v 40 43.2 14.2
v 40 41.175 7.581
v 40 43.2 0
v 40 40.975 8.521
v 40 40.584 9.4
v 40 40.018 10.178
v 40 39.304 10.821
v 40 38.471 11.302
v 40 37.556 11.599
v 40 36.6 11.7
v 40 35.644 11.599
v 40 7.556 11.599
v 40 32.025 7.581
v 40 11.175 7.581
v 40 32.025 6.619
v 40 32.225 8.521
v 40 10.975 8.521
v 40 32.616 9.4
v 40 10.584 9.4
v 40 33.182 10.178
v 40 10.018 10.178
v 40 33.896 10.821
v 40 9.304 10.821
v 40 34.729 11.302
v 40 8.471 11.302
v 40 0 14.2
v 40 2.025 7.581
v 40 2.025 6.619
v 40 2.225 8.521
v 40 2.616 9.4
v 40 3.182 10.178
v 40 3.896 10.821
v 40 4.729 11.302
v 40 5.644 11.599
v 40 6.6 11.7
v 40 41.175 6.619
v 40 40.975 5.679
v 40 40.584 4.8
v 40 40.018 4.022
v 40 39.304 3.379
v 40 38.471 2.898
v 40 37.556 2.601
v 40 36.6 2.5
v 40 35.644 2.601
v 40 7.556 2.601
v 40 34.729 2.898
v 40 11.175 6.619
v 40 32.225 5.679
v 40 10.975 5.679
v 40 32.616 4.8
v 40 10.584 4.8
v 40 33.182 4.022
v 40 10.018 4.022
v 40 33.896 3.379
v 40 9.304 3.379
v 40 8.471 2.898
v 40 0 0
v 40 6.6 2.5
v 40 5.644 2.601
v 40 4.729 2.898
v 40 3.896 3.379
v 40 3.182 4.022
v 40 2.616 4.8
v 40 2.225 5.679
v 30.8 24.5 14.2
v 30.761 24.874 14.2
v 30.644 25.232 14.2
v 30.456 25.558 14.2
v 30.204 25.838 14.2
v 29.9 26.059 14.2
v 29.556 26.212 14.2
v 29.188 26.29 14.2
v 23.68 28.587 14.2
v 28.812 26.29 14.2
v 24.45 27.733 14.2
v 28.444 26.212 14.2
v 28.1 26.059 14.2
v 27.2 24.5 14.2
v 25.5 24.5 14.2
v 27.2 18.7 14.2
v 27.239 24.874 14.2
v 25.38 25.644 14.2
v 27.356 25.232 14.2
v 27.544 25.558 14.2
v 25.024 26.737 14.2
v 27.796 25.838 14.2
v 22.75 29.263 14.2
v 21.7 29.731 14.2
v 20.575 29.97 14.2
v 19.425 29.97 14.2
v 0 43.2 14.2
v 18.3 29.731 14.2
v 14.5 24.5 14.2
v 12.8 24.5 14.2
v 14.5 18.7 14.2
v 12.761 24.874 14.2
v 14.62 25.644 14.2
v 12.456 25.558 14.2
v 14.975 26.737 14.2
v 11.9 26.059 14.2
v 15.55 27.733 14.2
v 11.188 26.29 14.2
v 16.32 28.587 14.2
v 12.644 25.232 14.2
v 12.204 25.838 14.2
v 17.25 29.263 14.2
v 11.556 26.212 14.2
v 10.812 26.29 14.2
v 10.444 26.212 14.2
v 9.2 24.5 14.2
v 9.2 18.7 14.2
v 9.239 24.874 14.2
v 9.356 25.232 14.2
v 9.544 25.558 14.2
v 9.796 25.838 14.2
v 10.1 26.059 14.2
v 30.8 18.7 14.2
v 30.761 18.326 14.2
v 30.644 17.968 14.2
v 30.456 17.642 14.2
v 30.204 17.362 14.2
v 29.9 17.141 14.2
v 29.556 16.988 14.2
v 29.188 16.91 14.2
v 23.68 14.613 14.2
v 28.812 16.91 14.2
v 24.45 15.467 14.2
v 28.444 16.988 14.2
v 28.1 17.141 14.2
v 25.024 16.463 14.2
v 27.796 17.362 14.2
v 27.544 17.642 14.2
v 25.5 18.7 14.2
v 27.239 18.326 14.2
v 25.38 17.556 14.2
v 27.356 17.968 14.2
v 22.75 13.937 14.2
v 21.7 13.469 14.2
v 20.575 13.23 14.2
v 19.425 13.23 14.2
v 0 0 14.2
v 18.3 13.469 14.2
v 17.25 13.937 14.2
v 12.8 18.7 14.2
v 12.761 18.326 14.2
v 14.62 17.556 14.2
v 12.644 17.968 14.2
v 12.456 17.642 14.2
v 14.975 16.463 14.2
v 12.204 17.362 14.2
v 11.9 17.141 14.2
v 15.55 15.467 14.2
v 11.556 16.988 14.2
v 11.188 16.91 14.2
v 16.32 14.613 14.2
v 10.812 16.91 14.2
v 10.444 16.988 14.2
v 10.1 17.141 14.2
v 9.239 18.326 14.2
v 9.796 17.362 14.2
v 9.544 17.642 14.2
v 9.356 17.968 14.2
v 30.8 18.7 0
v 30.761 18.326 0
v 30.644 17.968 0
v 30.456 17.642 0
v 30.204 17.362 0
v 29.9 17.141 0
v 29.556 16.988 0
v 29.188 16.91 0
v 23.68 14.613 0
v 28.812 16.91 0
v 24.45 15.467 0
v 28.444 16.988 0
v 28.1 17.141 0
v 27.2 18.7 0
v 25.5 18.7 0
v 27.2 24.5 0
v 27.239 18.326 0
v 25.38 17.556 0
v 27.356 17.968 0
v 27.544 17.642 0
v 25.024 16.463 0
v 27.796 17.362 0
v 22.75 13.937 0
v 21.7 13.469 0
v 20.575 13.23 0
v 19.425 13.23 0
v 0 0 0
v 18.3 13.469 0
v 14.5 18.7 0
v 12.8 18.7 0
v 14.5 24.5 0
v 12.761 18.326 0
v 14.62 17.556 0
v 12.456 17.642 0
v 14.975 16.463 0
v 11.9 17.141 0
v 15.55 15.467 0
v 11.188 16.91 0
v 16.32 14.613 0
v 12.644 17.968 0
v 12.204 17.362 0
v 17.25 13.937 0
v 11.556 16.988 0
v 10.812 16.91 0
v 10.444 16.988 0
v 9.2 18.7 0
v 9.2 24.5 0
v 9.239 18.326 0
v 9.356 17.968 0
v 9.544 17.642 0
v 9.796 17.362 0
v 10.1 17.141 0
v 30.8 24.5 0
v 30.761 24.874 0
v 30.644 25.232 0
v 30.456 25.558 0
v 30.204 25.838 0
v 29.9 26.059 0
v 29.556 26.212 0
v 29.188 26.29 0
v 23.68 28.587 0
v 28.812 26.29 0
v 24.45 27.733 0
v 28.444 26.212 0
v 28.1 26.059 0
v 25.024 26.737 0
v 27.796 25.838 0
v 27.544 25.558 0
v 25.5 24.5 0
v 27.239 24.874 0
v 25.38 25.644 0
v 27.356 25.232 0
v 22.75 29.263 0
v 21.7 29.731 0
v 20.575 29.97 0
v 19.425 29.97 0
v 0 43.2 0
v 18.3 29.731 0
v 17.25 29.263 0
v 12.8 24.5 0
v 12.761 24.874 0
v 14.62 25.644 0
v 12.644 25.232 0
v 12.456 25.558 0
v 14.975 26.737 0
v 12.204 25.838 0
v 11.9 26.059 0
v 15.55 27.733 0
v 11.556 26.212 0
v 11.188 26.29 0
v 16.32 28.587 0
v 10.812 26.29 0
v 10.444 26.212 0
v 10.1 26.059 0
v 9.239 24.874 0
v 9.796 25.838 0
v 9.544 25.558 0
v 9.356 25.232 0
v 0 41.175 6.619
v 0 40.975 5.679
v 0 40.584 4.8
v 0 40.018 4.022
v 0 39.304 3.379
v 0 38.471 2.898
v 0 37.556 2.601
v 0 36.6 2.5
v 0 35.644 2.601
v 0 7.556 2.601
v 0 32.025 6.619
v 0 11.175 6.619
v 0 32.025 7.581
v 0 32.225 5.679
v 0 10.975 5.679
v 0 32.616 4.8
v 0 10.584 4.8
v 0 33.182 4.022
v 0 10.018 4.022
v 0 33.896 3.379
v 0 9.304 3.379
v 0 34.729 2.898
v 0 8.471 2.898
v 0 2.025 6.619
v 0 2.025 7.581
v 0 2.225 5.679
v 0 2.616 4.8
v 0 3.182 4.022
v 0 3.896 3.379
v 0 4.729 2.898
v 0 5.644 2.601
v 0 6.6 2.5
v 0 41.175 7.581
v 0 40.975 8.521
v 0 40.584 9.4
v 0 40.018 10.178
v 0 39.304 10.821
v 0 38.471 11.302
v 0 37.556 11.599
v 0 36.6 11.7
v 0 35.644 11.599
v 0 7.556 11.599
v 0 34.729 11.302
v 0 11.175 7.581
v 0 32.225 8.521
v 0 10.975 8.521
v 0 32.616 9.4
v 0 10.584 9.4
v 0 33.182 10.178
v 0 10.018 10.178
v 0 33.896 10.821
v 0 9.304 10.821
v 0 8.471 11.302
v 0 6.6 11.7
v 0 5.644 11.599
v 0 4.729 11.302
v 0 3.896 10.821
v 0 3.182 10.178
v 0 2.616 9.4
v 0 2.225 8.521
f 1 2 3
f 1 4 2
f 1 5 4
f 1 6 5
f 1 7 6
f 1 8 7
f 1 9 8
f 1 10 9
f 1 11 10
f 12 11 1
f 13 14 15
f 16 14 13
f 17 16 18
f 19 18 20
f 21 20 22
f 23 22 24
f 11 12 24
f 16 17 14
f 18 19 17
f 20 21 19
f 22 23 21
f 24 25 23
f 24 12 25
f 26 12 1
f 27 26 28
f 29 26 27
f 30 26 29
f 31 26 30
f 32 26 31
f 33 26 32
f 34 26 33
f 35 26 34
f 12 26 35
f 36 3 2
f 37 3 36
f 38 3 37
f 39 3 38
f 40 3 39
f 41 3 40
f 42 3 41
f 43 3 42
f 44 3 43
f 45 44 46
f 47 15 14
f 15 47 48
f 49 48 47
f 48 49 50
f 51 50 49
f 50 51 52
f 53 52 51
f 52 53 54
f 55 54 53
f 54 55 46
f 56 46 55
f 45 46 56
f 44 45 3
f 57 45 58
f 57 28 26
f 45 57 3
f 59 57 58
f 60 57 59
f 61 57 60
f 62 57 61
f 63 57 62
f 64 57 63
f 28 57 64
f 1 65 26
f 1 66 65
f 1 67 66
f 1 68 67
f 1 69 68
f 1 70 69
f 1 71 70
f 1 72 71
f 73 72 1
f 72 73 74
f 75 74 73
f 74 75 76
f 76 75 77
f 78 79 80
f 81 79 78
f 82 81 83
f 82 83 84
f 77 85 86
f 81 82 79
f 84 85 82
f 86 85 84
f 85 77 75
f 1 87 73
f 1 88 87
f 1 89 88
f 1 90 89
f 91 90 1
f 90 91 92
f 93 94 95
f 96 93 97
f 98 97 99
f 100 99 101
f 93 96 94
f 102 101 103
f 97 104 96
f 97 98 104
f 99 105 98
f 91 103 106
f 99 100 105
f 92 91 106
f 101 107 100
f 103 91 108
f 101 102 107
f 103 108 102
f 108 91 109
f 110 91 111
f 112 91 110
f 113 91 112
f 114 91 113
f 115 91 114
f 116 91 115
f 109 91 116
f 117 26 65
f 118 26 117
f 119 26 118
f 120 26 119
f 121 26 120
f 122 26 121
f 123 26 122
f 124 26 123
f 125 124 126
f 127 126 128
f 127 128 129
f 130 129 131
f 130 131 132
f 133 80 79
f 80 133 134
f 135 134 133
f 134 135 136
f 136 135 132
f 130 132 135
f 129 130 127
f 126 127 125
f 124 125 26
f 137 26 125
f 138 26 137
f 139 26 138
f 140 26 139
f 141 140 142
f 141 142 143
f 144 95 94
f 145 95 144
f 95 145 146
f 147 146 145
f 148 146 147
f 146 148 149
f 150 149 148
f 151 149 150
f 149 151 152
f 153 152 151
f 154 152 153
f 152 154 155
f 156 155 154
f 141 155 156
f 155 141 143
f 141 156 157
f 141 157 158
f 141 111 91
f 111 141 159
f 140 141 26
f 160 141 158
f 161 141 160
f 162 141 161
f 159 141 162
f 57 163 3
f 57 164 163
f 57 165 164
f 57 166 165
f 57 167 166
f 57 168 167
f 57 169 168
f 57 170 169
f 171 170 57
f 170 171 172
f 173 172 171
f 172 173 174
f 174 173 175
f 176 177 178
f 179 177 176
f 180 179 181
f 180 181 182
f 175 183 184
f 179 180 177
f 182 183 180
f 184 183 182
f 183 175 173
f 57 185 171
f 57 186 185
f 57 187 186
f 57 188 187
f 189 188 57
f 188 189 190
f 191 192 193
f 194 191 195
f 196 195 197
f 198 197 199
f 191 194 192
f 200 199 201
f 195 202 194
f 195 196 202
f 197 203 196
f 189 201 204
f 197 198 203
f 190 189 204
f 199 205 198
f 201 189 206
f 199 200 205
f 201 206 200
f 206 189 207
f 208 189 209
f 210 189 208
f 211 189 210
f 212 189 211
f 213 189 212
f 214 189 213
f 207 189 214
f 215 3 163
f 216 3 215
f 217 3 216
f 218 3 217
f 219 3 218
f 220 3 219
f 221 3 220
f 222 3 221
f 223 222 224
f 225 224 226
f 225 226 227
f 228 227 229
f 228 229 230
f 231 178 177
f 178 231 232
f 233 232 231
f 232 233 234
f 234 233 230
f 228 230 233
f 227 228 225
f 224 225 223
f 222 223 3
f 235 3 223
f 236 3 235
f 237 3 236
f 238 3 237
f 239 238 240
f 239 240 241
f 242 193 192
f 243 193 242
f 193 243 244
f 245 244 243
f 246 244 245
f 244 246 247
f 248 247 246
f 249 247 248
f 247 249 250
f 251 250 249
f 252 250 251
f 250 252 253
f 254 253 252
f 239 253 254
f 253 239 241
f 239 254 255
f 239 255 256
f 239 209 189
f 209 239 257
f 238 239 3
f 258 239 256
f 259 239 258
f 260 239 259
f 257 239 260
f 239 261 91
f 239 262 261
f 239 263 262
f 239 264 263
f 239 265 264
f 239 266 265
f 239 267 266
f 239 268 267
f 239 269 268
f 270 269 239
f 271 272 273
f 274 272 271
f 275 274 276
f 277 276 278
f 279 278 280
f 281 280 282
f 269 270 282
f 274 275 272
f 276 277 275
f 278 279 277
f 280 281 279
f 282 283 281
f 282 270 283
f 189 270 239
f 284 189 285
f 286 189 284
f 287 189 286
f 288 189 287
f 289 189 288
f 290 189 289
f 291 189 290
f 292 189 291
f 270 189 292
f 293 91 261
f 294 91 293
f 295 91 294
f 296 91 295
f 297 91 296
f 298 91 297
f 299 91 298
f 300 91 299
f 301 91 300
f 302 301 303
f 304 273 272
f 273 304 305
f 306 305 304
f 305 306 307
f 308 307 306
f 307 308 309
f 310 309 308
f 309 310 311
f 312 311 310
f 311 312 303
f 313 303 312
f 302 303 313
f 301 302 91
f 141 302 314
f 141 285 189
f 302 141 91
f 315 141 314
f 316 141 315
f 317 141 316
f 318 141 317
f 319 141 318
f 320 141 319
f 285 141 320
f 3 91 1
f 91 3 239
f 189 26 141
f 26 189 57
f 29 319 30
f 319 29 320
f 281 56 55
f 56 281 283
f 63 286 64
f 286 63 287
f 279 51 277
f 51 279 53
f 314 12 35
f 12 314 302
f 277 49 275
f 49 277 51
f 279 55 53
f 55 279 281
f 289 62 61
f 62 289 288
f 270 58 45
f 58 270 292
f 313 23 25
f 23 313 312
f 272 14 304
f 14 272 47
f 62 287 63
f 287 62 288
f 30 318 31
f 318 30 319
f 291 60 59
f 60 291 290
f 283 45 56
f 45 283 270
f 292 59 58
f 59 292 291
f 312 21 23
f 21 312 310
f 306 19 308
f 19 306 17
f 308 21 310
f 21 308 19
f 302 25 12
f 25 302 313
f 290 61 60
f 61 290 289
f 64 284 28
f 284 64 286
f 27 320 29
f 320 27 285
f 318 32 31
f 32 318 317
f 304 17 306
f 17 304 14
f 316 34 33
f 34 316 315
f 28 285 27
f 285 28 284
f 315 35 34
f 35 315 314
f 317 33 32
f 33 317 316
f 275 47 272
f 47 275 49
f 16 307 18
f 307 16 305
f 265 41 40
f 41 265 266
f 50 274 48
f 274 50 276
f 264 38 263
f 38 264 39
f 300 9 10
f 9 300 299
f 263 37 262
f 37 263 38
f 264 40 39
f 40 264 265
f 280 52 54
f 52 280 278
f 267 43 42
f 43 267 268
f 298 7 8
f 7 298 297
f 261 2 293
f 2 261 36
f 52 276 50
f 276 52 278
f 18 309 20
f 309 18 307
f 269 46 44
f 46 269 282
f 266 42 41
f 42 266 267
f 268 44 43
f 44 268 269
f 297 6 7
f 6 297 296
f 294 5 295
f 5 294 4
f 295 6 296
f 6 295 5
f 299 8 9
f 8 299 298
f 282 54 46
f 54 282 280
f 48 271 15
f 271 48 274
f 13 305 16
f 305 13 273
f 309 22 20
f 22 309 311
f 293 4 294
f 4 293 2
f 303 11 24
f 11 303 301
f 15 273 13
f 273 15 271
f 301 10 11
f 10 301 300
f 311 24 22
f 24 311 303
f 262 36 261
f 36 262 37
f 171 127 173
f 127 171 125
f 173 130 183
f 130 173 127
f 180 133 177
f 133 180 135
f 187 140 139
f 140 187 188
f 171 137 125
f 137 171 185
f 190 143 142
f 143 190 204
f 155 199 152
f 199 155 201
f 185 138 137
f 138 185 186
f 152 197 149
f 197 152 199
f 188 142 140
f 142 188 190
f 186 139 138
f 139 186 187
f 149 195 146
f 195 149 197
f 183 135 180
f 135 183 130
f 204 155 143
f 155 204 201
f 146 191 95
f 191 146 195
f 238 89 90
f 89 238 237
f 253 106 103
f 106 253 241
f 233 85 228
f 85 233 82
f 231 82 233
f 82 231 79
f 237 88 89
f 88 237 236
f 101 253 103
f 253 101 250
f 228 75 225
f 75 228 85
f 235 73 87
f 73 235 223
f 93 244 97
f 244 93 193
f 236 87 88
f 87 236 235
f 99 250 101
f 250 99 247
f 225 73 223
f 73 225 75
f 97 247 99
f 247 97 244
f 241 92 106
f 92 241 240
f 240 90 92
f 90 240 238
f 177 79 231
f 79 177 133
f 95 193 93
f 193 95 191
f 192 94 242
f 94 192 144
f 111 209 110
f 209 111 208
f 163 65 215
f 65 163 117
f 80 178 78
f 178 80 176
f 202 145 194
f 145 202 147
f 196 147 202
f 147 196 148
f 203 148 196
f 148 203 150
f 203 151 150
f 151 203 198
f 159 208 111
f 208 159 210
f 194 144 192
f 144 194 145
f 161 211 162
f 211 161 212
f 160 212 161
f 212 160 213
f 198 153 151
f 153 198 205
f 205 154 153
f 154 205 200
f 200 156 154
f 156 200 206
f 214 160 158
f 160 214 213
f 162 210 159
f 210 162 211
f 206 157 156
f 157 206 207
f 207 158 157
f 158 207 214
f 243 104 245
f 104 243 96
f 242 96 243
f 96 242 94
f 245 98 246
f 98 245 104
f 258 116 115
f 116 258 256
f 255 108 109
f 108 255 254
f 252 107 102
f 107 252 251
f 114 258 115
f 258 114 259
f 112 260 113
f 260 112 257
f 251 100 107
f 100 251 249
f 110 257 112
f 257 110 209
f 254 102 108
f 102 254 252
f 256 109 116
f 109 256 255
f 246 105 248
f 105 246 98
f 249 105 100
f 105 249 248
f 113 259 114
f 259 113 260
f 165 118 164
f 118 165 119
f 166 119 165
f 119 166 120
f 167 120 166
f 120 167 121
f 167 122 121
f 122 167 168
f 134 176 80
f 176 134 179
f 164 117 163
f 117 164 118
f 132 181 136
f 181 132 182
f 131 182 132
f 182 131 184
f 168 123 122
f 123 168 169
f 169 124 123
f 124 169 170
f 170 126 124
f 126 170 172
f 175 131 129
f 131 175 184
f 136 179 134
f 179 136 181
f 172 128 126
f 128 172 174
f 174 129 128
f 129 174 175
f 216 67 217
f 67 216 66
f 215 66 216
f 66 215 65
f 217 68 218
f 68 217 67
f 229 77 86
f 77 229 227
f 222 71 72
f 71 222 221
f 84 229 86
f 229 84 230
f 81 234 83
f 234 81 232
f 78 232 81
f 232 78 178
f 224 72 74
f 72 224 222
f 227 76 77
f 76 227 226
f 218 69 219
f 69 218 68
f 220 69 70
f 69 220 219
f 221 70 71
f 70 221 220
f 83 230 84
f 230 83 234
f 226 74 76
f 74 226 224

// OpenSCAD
$fn = 30;
l_axis =  30;
d_axis = 9.2;
r_axis = d_axis / 2;
r_nut  = 5.5;
y_wall = 2.0;
z_wall = 2.5;

over = 0.05;
x_a = 40.0;
y_a = l_axis + d_axis + 2 * y_wall;
z_a = d_axis + 2 * z_wall;
z_ao = z_a + 2 * over;

x_c = x_a / 2;
y_1 = r_axis + y_wall;
y_2 = y_1 + l_axis;
y_1n = y_1 + r_axis + y_wall + r_nut;
y_2n = y_2 - r_axis - y_wall - r_nut;

dy_mo = 9;
r_mo = 3.2 / 2 + 0.2;

rot_y = [0,90,0];

module coord_y_nut_holder() {
  difference() {
    cube( [x_a, y_a, z_a] );
    
    // axis
    translate([-over,y_1,z_wall+r_axis]) rotate(rot_y) cylinder( r=r_axis, h=x_a+2*over );
    translate([-over,y_2,z_wall+r_axis]) rotate(rot_y) cylinder( r=r_axis, h=x_a+2*over );
    
    // central nut hole
    translate([x_c,y_1n,-over]) cylinder( r=r_nut, h=z_ao );
    translate([x_c,y_2n,-over]) cylinder( r=r_nut, h=z_ao );
    translate([x_c-r_nut,y_1n,-over])    cube( [2*r_nut,y_2n-y_1n,z_ao] );
    
    // mounting nut holes
    translate([x_c-dy_mo-r_mo,y_1n,-over])    cube( [2*r_mo,y_2n-y_1n,z_ao] );
    translate([x_c+dy_mo-r_mo,y_1n,-over])    cube( [2*r_mo,y_2n-y_1n,z_ao] );
    translate([x_c-dy_mo,y_1n,-over]) cylinder( r=r_mo, h=z_ao );
    translate([x_c-dy_mo,y_2n,-over]) cylinder( r=r_mo, h=z_ao );
    translate([x_c+dy_mo,y_1n,-over]) cylinder( r=r_mo, h=z_ao );
    translate([x_c+dy_mo,y_2n,-over]) cylinder( r=r_mo, h=z_ao );
  }

}

coord_y_nut_holder();

echo( y_a, z_a, (y_2n-y_1n) );
